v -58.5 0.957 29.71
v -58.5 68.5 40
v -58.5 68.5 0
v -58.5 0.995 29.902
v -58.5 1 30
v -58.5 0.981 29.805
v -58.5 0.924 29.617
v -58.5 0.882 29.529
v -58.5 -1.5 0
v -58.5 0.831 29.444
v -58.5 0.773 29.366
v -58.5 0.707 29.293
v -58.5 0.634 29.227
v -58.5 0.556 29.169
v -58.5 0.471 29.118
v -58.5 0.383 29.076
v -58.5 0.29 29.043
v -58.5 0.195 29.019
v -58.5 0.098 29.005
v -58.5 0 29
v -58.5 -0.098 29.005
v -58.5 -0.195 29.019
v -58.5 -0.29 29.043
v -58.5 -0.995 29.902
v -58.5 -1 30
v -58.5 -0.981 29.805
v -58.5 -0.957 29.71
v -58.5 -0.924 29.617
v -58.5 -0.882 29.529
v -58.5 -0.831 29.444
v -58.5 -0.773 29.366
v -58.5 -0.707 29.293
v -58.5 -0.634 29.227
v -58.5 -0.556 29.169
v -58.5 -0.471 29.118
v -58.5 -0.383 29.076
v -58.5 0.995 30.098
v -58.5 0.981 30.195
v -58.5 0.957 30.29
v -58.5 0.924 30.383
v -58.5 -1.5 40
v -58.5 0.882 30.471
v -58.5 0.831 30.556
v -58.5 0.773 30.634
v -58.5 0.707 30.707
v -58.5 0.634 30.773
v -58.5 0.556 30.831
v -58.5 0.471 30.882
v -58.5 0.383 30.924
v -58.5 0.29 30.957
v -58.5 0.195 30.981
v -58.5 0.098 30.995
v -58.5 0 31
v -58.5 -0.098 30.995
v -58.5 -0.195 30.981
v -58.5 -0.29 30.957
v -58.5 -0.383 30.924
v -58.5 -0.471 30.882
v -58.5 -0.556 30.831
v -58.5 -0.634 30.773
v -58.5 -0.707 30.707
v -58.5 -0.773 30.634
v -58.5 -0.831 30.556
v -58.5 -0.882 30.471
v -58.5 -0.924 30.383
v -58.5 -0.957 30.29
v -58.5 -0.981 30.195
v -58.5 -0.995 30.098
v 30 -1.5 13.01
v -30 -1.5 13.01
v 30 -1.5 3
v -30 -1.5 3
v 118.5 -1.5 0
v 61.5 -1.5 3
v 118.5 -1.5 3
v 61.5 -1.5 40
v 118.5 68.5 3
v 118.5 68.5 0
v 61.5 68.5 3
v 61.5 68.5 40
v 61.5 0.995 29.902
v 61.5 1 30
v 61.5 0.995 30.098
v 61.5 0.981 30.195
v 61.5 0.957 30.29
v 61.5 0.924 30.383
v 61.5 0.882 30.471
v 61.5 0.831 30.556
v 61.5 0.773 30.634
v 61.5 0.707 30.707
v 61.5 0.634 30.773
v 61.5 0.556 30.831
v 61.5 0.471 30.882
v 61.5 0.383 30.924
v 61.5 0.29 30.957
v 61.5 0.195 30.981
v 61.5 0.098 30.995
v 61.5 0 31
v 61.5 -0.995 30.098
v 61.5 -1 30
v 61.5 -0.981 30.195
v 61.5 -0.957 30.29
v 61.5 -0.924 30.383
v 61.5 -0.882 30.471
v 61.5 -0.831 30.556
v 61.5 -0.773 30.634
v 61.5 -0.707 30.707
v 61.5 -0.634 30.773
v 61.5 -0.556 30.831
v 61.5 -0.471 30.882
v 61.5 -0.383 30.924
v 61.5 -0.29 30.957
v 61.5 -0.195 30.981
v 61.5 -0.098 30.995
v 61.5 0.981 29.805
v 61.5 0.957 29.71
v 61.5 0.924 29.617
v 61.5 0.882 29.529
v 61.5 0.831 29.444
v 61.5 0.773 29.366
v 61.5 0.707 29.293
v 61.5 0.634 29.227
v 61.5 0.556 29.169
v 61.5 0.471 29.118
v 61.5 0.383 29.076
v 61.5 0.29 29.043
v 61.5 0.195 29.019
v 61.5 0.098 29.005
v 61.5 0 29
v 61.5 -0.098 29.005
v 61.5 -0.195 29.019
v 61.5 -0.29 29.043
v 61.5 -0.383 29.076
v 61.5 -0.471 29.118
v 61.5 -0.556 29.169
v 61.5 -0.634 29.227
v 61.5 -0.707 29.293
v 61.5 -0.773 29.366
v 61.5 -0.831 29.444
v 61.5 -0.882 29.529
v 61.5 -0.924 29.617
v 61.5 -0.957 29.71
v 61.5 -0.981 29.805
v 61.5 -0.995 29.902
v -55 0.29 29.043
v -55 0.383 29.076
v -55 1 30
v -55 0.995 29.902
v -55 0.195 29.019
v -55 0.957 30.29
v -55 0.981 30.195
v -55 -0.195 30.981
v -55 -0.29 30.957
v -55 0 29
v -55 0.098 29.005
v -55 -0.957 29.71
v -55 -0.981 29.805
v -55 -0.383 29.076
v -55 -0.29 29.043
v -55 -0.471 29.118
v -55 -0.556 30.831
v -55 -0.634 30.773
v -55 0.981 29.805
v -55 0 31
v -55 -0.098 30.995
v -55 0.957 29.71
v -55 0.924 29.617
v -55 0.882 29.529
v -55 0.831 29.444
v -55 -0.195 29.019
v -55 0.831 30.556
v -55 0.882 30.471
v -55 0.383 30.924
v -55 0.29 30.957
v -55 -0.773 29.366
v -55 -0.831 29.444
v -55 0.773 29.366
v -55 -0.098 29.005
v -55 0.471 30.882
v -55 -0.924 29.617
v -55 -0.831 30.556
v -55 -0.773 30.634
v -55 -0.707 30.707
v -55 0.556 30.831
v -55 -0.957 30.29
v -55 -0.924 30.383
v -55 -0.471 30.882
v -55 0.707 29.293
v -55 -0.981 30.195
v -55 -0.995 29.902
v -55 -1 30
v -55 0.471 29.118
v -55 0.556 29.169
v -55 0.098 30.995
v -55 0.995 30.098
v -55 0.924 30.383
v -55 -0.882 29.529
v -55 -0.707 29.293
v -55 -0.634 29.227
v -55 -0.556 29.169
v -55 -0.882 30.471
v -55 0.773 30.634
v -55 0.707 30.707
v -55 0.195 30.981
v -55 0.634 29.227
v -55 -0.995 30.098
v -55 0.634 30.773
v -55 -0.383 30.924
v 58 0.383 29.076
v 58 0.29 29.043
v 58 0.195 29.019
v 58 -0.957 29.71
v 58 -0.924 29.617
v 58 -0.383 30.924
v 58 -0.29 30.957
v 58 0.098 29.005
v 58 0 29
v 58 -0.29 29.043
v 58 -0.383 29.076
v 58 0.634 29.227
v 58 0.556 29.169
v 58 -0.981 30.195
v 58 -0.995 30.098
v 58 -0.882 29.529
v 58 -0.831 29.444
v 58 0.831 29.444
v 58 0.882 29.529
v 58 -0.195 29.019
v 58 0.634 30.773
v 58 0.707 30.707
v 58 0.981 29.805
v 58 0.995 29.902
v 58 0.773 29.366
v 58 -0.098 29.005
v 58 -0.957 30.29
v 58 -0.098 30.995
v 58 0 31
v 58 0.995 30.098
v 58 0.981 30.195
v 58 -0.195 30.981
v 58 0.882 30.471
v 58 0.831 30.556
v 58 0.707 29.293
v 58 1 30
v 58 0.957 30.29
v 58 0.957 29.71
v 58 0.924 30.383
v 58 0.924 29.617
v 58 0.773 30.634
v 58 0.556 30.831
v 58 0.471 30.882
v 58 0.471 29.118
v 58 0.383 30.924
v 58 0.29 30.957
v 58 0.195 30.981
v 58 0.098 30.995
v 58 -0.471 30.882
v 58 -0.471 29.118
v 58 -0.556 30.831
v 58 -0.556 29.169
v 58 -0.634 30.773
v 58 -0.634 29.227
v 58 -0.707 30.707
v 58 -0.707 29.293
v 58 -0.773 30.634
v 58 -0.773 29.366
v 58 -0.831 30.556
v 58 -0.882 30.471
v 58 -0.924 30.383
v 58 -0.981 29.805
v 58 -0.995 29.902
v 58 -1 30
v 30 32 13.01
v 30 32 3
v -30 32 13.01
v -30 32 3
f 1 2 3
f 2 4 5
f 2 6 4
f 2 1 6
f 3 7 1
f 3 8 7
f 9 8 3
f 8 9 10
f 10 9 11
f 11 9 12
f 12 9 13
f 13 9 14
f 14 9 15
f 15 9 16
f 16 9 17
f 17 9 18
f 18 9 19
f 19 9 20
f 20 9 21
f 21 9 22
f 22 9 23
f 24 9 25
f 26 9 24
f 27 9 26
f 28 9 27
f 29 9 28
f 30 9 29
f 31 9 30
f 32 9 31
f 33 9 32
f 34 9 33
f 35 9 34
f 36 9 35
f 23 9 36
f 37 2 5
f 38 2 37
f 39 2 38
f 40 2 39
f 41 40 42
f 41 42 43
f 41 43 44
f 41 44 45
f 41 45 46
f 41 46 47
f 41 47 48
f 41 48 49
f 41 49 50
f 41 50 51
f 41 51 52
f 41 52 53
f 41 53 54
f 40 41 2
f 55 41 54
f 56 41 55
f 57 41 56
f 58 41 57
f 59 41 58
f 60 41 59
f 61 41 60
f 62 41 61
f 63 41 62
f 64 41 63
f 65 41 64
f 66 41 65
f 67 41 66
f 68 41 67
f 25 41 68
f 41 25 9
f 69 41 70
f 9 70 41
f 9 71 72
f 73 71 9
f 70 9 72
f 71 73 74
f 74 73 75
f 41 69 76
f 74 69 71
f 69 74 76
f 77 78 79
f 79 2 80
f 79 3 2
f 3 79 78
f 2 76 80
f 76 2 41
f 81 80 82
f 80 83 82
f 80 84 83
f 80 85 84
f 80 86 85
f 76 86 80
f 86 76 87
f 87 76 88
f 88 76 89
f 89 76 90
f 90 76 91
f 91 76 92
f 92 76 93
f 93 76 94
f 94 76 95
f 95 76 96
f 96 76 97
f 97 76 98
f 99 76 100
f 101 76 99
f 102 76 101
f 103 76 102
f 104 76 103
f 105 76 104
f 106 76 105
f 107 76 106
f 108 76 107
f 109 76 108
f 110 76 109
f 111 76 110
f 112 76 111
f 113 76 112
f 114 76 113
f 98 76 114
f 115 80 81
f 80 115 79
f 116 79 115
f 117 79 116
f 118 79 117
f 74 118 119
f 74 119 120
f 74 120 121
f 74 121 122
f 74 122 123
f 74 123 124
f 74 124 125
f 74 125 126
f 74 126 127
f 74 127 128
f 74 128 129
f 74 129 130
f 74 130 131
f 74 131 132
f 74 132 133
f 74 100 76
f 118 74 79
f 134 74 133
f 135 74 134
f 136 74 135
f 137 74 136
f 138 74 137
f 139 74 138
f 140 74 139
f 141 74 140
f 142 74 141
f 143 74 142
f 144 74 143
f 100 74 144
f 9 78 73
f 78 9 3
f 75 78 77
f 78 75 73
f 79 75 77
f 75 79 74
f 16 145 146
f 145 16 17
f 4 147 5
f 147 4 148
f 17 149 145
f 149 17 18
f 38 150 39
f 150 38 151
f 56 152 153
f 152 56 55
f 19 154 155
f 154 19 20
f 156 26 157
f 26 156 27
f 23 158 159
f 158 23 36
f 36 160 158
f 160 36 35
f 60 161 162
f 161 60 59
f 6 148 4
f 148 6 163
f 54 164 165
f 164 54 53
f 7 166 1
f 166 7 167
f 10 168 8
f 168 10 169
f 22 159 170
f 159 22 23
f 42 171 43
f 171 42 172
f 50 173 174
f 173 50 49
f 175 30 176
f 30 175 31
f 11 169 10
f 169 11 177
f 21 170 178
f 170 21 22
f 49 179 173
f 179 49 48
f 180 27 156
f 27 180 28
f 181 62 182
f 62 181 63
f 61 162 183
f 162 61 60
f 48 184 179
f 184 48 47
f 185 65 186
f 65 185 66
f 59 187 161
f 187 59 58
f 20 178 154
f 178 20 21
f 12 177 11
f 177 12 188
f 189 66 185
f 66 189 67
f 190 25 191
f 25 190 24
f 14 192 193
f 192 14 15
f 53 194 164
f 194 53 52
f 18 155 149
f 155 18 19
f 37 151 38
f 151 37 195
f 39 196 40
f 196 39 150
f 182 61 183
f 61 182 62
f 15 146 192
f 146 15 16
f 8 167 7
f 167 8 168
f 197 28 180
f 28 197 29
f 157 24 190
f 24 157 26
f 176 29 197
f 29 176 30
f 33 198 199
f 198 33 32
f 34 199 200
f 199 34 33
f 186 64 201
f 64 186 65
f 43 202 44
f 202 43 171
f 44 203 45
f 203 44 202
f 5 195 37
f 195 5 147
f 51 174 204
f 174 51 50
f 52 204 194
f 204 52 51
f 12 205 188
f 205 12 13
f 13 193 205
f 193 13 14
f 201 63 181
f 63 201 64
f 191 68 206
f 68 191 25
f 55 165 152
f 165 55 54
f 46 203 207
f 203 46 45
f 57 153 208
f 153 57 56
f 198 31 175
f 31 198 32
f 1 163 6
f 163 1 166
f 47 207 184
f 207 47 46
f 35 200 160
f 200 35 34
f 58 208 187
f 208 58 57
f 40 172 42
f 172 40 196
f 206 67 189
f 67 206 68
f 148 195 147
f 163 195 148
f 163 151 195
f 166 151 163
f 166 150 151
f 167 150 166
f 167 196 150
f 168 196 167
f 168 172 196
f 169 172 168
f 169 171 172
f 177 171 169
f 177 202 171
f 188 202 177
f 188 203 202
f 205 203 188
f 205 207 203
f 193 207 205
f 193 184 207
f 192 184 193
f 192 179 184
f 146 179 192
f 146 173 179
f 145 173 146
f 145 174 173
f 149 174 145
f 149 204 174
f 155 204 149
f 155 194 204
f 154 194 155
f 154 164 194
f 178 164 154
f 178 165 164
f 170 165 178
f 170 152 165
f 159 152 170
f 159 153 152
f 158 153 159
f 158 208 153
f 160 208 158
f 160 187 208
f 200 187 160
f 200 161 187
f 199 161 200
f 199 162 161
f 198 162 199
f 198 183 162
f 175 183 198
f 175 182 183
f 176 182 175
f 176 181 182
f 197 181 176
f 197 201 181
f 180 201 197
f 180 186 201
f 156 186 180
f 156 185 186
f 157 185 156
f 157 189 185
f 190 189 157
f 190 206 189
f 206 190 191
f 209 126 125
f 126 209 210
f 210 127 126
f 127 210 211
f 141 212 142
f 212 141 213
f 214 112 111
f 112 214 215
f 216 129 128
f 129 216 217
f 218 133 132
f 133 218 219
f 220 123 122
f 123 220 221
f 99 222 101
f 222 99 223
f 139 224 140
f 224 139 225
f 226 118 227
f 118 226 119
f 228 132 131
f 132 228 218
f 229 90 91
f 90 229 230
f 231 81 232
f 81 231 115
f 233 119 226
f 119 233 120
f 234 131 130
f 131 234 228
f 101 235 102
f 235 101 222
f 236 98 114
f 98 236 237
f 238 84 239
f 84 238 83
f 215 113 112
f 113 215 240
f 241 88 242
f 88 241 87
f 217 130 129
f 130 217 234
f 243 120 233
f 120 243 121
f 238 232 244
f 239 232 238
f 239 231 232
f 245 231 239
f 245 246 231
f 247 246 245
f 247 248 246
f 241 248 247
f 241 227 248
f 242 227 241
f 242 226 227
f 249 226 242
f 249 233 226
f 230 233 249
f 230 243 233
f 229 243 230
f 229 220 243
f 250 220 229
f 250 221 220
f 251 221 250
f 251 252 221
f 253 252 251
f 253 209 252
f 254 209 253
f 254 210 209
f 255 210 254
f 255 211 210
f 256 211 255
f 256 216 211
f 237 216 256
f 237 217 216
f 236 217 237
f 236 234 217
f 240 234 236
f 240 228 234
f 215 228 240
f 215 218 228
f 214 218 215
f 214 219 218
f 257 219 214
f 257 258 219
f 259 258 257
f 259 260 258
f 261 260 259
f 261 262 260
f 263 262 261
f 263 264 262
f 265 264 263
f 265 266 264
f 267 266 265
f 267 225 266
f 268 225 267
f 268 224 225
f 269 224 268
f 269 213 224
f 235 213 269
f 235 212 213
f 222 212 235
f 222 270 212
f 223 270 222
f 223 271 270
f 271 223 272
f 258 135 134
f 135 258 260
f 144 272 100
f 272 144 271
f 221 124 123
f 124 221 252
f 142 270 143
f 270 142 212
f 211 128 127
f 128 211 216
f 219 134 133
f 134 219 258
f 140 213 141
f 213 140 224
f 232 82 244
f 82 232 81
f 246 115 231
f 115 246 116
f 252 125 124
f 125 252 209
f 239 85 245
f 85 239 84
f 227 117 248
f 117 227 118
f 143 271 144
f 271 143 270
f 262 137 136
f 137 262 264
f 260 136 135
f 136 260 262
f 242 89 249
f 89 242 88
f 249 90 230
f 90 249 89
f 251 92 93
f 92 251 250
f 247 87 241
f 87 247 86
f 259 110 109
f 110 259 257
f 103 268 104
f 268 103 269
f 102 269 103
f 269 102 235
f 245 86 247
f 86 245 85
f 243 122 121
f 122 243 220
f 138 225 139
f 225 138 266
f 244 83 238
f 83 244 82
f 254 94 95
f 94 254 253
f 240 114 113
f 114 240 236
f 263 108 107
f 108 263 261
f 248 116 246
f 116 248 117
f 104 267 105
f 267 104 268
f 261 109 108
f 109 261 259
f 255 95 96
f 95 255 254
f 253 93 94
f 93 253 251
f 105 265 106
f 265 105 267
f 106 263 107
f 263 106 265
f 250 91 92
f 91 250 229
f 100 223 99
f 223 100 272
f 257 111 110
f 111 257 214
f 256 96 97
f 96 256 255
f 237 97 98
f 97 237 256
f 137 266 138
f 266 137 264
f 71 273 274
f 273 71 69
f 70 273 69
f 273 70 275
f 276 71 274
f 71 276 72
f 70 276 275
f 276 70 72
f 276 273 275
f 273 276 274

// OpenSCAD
// Mini horizontal gel-electrophoresis buffer tank
// Print orientation: base on XY plane, open top facing +Z

$fn = 64;

// ---- Tank dimensions ----
tank_x = 120;      // outer length (X)
tank_y = 70;       // outer width (Y)
tank_z = 40;       // outer height (Z)

// ---- Walls ----
wall = 3;          // wall thickness
floor = 3;         // floor thickness

// ---- Platform ----
plat_len   = 60;   // platform length in X
plat_top_z = 13;   // platform top height (floor + 10)
plat_w     = tank_y - 2*wall;  // platform width = inner width

// ---- Holes ----
hole_d = 2;        // electrode hole diameter
hole_y = 0;        // hole Y position
hole_z = 30;       // hole Z position

// ---- Cutting overlap ----
eps = 0.5;         // extension past cut faces

difference() {
    // Tank body
    union() {
        // Side walls and floor
        hull() {
            for (sx = [-1, 1])
                translate([sx * (tank_x/2 - wall/2), -wall/2, 0])
                    cube([wall, tank_y, tank_z]);
        }
        // Floor (slightly overlapping the hull for a clean union)
        translate([-wall/2, -wall/2, 0])
            cube([tank_x, tank_y, floor]);
    }

    // Raised platform
    translate([-plat_len/2, -plat_w/2, floor])
        cube([plat_len, plat_w, plat_top_z - floor + 0.01]);

    // Electrode holes through end walls
    for (ox = [-1, 1])
        translate([ox * (tank_x/2 - wall/2) - eps, hole_y, hole_z])
            rotate([0, 90, 0])
                cylinder(d = hole_d, h = wall + 2*eps);
}
